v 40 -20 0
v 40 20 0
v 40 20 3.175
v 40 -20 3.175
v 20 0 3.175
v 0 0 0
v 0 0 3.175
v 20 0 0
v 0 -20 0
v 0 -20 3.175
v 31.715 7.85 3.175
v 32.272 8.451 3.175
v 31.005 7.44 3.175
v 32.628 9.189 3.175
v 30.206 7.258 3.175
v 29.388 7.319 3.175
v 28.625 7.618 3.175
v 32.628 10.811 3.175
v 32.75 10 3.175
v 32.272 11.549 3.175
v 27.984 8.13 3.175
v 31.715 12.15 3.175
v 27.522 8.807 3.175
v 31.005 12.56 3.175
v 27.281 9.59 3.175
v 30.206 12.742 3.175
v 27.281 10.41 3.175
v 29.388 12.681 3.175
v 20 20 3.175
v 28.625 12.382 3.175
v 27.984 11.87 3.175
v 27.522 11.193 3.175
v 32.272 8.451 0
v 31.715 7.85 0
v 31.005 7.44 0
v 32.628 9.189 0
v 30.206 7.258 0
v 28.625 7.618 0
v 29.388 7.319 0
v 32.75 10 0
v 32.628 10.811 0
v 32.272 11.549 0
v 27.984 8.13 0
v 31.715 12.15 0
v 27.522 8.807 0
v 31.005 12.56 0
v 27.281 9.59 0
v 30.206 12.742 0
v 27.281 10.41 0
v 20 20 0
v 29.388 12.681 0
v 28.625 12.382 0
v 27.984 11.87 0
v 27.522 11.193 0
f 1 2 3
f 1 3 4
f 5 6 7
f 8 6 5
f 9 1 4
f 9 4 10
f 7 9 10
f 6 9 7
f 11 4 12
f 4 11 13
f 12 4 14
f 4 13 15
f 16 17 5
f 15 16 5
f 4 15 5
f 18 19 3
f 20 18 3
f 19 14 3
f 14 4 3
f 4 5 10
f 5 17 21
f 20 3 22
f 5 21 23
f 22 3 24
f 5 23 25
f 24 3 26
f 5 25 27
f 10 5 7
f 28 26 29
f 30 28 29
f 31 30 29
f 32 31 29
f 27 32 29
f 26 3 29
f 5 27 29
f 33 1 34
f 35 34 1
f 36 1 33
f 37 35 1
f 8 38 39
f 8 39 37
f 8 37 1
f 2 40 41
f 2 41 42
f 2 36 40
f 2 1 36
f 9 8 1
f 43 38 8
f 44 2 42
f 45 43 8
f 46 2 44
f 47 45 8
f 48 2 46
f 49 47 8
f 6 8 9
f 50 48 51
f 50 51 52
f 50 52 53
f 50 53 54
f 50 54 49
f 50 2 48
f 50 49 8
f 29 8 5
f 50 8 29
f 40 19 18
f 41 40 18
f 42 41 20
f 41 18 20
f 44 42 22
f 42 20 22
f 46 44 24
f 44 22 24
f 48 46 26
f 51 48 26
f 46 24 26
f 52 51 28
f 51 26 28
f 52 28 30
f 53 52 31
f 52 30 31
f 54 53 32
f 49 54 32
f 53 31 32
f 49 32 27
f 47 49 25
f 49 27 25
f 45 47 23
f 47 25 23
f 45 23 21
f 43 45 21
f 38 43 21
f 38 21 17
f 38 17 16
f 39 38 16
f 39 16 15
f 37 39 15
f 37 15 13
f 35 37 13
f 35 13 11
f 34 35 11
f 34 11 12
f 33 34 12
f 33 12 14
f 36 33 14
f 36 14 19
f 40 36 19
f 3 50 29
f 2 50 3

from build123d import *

# Parameters (mm, degrees)
BOSS_EXTRUDE1_DEPTH = 3.175
CUT_EXTRUDE1_REACH  = 5.175
SKETCH2_R           = 2.75


with BuildPart() as part:
    # Sketch1 → Boss-Extrude1 (new body)
    with BuildSketch(Plane.XY):
        Polygon((0, 0), (20, 0), (20, 20), (40, 20), (40, -20), (0, -20), align=None)
    extrude(amount=BOSS_EXTRUDE1_DEPTH)

    # Sketch2 → Cut-Extrude1 (cut, up to next)
    with BuildSketch(Plane.XY.offset(3.175), mode=Mode.PRIVATE) as cut_extrude1_sk1:
        with Locations((30, 10)):
            Circle(SKETCH2_R)
    cut_extrude1_tool1 = extrude(cut_extrude1_sk1.sketch, amount=-CUT_EXTRUDE1_REACH, mode=Mode.PRIVATE) & part.part
    add(cut_extrude1_tool1.solids().sort_by_distance((30, 10, 3.175))[0], mode=Mode.SUBTRACT)


solid = part.part
